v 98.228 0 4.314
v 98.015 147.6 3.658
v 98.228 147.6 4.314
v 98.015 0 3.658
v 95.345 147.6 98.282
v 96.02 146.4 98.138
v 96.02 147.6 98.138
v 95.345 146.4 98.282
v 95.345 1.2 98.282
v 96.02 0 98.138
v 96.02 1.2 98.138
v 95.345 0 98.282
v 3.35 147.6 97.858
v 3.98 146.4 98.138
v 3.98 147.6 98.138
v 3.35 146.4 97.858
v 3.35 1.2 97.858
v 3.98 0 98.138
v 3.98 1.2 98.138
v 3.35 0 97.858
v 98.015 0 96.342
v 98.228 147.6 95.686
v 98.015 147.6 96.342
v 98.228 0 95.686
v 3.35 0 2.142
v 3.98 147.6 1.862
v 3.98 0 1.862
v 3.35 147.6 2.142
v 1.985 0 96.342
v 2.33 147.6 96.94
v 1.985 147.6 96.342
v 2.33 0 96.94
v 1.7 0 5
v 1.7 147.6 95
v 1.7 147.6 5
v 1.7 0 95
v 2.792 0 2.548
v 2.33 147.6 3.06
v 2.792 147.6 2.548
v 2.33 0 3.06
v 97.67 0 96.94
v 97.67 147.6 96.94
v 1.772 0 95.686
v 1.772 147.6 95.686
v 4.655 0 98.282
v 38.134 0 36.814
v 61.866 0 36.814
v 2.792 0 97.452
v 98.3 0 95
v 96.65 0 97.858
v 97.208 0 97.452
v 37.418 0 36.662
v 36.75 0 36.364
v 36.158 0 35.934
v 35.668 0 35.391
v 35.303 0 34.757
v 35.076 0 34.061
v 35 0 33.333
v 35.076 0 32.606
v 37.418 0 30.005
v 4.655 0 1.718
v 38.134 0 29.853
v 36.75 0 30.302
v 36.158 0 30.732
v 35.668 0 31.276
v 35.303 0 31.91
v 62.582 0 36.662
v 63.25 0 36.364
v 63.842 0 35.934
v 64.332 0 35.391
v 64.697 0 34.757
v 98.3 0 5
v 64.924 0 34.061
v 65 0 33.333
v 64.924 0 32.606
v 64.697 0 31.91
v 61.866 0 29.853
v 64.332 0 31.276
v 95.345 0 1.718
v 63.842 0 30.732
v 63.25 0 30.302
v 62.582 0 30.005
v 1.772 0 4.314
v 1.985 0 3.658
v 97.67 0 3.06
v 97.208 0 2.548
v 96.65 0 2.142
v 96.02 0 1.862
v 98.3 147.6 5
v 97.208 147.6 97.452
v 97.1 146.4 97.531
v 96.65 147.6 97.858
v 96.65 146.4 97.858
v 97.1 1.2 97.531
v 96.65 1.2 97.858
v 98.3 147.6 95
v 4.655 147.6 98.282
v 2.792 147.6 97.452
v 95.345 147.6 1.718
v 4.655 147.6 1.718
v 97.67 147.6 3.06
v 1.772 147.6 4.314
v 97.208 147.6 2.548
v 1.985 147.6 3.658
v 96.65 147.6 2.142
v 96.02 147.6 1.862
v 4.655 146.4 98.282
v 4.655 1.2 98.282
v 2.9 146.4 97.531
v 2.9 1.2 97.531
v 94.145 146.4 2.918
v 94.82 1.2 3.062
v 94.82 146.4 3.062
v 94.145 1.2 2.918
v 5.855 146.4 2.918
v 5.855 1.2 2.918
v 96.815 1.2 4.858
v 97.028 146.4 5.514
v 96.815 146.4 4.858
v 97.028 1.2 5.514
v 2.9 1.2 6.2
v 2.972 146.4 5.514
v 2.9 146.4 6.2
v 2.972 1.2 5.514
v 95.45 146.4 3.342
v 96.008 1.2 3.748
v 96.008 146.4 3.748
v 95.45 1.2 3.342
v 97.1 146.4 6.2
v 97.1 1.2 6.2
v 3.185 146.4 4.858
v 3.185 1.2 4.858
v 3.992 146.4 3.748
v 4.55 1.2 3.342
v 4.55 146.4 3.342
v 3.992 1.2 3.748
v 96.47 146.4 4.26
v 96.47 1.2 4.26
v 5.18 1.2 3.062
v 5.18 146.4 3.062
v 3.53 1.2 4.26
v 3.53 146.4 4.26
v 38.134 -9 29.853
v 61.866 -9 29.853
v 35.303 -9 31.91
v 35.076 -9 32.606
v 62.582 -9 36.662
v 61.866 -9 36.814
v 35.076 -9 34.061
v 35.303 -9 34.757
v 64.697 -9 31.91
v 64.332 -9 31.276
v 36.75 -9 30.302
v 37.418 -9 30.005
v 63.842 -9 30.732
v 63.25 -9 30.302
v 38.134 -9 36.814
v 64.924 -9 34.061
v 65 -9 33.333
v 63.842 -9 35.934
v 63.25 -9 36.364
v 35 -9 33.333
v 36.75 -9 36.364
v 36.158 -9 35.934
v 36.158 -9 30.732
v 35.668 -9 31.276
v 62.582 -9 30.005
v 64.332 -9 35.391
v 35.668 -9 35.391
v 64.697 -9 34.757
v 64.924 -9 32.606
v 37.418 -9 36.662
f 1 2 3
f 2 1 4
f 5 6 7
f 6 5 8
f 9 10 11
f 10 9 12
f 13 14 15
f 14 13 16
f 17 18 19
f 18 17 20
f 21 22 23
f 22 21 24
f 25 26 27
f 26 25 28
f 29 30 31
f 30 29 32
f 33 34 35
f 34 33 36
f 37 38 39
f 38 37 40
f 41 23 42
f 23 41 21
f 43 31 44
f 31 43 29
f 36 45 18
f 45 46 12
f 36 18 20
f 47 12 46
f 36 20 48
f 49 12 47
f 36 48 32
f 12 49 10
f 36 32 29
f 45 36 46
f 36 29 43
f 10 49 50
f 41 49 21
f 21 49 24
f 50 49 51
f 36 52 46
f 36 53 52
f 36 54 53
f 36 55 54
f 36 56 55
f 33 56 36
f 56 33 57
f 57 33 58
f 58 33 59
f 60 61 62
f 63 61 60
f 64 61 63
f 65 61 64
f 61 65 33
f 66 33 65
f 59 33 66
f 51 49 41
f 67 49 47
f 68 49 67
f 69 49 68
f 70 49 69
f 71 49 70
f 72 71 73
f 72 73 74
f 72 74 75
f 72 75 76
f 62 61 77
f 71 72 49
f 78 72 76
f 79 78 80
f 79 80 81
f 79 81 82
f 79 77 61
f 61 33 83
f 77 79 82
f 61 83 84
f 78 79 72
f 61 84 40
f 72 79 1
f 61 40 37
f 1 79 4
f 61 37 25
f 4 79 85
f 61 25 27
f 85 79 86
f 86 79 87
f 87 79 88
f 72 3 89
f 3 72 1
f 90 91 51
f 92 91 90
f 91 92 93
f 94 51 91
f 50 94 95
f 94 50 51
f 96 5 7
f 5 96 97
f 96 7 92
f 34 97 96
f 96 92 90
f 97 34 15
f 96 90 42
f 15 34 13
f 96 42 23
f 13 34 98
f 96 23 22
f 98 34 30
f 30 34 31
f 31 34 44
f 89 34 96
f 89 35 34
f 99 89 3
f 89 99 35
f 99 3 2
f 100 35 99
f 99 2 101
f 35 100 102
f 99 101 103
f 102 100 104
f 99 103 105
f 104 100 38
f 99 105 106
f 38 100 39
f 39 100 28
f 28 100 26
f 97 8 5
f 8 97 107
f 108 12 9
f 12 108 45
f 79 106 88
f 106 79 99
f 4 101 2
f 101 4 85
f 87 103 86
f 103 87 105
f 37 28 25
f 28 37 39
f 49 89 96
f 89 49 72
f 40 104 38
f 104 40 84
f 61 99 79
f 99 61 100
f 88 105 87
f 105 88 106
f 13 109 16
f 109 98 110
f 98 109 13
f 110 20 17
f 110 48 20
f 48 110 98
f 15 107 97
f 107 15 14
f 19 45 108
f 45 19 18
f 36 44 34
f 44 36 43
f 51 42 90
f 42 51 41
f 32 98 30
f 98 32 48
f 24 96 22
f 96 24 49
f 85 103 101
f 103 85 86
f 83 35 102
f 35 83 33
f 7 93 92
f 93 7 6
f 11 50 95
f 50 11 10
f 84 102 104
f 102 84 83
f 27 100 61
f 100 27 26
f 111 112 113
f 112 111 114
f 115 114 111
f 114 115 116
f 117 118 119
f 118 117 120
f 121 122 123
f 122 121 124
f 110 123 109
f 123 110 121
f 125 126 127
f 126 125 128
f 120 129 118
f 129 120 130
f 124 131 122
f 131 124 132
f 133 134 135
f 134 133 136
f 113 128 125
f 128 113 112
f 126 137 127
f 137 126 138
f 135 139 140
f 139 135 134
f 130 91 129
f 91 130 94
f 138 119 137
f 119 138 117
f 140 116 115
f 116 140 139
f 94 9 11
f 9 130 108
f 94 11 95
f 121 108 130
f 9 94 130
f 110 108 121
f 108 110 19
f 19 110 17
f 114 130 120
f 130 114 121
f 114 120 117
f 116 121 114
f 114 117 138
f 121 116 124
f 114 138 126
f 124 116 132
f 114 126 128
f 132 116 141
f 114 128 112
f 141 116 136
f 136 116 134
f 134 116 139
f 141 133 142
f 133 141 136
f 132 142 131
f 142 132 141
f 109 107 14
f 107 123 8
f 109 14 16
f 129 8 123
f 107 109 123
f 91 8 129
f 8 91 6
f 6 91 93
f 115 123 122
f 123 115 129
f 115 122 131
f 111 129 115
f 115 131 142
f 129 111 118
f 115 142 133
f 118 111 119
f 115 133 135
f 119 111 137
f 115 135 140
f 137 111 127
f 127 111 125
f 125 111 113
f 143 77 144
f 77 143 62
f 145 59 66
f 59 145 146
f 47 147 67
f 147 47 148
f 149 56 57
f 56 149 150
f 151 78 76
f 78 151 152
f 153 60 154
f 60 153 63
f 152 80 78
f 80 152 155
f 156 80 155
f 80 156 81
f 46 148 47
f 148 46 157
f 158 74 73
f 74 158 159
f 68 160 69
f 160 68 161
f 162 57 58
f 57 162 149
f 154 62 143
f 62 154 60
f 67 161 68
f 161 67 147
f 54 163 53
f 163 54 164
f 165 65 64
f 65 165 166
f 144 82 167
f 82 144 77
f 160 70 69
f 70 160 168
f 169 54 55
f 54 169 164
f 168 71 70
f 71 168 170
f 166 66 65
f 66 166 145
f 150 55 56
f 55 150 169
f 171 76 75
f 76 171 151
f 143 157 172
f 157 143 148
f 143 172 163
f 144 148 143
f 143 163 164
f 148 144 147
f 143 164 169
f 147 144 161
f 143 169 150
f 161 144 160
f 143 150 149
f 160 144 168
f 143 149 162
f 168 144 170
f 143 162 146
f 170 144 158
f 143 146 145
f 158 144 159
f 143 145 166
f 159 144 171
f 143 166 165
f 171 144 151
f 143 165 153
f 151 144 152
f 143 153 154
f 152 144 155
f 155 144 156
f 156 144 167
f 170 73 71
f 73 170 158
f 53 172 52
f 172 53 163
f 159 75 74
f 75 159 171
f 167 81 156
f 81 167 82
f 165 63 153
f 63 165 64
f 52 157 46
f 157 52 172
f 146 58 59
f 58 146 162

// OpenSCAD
$fn = 30;

boxWidth = [50,100,150];
boxHeight = [50,100,150];
boxDepth = [100,150,200];

bottom = 0;
middle = 1;
top = 2;
topbottom = 3;
left = 0;
right = 2;
leftright = 3;


cornerRadius = 5;
wallThickness = 1.2;
tolerance = 0.5;




box(1,1,1,cornerRadius,left,topbottom);

/*
translate([boxWidth[1],0,0])
box(2,0,1,cornerRadius,right,bottom);

translate([boxWidth[1],0,boxHeight[0]])
box(1,0,1,cornerRadius,middle,top);

translate([boxWidth[1] + boxWidth[1],0,boxHeight[0]])
box(0,0,1,cornerRadius, right, top);
*/

module box(w, h, d, r, horizontal, vertical){
    
    *boxFrame(w, h, d, r, horizontal, vertical);

    
    union(){
        boxTray(w, h, d, r-wallThickness);
        
        translate([boxWidth[w]/2,1,boxHeight[h]/3])
        knob();
    }
    
    
}

module boxTray(w, h, d, r){
    
    difference(){
        
        trayBlock(boxWidth[w] - 2*cornerRadius, boxHeight[h] - 2*cornerRadius, boxDepth[d]/2 - wallThickness, r-tolerance);
        
        translate([wallThickness, wallThickness, wallThickness])
        trayBlock(boxWidth[w] - 2*cornerRadius - 2*wallThickness, boxHeight[h], boxDepth[d]/2 - 2*wallThickness, r-tolerance);
        
    }
    
}

module boxFrame(w, h, d, r, horizontal, vertical){
    
    union(){
        difference(){
            
            frameBlock(w, h, d, r);
            
            translate([0, -wallThickness, 0])
            frameBlock(w, h, d, r-wallThickness);
            
            for(j = [0 : (boxDepth[d]/50)-1]){
                
                if((vertical == middle) || (vertical == bottom)){
                    for( i = [0 : (boxWidth[w]/50)-1]){
                        translate([19.5 + i*50,19.5+ j * 50, boxHeight[h]-2])
                        cube([11,11,10]);
                    }
                }
                if ((horizontal == left) || (horizontal == middle)){
                    for( i = [0 : (boxHeight[h]/50)-1]){
                        translate([boxWidth[w]-2,19.5 + j * 50, 19.5 + i * 50])
                        cube([10,11,11]);
                    }
                }
            }
            
        }
        
        for(j = [0 : (boxDepth[d]/50)-1]){
            if((vertical == top) || (vertical == middle)){
                for( i = [0 : (boxWidth[w]/50)-1]){
                    translate([20 + i*50,20 + j * 50, -wallThickness])
                    cube([10,10,1+wallThickness]);
                }
            }
            if ((horizontal == right) || (horizontal == middle)){
                for( i = [0 : (boxHeight[h]/50)-1]){
                    translate([-wallThickness,20 + j * 50, 20 + i * 50])
                    cube([1+wallThickness,10,10]);
                }
            }
        }
        
    }
        
}



    

module frameBlock(w, h, d, r){
   if( (w < len(boxWidth)) && (h < len(boxHeight)) && (d < len(boxDepth))){
        translate([cornerRadius, 0, cornerRadius])
        minkowski(){
            
            cube([boxWidth[w] - 2*cornerRadius, boxDepth[d]/2, boxHeight[h]-2*cornerRadius]);
        
            rotate([-90,0,0])
            cylinder(r = r, h = boxDepth[d]/2);   
        }
    }else{
        echo("Please choose valid parameter for width, height & depth");
    } 
}

module trayBlock(w, h, d, r){
    translate([cornerRadius, 0, cornerRadius])
    minkowski(){
            
        cube([w,d,h]);

        rotate([-90,0,0])
        cylinder(r = r, h = d);   
    }
}




module knob(){
    
    width = 30;
    height = 7;
    depth = 10;
    
    translate([-width/2+ height/2,0,0])
    rotate([90,0,0])
    hull(){
        
        cylinder(d = height, h = depth);
        
        translate([width-height,0,0])
        cylinder(d = height, h = depth);
        
    }
    
}
